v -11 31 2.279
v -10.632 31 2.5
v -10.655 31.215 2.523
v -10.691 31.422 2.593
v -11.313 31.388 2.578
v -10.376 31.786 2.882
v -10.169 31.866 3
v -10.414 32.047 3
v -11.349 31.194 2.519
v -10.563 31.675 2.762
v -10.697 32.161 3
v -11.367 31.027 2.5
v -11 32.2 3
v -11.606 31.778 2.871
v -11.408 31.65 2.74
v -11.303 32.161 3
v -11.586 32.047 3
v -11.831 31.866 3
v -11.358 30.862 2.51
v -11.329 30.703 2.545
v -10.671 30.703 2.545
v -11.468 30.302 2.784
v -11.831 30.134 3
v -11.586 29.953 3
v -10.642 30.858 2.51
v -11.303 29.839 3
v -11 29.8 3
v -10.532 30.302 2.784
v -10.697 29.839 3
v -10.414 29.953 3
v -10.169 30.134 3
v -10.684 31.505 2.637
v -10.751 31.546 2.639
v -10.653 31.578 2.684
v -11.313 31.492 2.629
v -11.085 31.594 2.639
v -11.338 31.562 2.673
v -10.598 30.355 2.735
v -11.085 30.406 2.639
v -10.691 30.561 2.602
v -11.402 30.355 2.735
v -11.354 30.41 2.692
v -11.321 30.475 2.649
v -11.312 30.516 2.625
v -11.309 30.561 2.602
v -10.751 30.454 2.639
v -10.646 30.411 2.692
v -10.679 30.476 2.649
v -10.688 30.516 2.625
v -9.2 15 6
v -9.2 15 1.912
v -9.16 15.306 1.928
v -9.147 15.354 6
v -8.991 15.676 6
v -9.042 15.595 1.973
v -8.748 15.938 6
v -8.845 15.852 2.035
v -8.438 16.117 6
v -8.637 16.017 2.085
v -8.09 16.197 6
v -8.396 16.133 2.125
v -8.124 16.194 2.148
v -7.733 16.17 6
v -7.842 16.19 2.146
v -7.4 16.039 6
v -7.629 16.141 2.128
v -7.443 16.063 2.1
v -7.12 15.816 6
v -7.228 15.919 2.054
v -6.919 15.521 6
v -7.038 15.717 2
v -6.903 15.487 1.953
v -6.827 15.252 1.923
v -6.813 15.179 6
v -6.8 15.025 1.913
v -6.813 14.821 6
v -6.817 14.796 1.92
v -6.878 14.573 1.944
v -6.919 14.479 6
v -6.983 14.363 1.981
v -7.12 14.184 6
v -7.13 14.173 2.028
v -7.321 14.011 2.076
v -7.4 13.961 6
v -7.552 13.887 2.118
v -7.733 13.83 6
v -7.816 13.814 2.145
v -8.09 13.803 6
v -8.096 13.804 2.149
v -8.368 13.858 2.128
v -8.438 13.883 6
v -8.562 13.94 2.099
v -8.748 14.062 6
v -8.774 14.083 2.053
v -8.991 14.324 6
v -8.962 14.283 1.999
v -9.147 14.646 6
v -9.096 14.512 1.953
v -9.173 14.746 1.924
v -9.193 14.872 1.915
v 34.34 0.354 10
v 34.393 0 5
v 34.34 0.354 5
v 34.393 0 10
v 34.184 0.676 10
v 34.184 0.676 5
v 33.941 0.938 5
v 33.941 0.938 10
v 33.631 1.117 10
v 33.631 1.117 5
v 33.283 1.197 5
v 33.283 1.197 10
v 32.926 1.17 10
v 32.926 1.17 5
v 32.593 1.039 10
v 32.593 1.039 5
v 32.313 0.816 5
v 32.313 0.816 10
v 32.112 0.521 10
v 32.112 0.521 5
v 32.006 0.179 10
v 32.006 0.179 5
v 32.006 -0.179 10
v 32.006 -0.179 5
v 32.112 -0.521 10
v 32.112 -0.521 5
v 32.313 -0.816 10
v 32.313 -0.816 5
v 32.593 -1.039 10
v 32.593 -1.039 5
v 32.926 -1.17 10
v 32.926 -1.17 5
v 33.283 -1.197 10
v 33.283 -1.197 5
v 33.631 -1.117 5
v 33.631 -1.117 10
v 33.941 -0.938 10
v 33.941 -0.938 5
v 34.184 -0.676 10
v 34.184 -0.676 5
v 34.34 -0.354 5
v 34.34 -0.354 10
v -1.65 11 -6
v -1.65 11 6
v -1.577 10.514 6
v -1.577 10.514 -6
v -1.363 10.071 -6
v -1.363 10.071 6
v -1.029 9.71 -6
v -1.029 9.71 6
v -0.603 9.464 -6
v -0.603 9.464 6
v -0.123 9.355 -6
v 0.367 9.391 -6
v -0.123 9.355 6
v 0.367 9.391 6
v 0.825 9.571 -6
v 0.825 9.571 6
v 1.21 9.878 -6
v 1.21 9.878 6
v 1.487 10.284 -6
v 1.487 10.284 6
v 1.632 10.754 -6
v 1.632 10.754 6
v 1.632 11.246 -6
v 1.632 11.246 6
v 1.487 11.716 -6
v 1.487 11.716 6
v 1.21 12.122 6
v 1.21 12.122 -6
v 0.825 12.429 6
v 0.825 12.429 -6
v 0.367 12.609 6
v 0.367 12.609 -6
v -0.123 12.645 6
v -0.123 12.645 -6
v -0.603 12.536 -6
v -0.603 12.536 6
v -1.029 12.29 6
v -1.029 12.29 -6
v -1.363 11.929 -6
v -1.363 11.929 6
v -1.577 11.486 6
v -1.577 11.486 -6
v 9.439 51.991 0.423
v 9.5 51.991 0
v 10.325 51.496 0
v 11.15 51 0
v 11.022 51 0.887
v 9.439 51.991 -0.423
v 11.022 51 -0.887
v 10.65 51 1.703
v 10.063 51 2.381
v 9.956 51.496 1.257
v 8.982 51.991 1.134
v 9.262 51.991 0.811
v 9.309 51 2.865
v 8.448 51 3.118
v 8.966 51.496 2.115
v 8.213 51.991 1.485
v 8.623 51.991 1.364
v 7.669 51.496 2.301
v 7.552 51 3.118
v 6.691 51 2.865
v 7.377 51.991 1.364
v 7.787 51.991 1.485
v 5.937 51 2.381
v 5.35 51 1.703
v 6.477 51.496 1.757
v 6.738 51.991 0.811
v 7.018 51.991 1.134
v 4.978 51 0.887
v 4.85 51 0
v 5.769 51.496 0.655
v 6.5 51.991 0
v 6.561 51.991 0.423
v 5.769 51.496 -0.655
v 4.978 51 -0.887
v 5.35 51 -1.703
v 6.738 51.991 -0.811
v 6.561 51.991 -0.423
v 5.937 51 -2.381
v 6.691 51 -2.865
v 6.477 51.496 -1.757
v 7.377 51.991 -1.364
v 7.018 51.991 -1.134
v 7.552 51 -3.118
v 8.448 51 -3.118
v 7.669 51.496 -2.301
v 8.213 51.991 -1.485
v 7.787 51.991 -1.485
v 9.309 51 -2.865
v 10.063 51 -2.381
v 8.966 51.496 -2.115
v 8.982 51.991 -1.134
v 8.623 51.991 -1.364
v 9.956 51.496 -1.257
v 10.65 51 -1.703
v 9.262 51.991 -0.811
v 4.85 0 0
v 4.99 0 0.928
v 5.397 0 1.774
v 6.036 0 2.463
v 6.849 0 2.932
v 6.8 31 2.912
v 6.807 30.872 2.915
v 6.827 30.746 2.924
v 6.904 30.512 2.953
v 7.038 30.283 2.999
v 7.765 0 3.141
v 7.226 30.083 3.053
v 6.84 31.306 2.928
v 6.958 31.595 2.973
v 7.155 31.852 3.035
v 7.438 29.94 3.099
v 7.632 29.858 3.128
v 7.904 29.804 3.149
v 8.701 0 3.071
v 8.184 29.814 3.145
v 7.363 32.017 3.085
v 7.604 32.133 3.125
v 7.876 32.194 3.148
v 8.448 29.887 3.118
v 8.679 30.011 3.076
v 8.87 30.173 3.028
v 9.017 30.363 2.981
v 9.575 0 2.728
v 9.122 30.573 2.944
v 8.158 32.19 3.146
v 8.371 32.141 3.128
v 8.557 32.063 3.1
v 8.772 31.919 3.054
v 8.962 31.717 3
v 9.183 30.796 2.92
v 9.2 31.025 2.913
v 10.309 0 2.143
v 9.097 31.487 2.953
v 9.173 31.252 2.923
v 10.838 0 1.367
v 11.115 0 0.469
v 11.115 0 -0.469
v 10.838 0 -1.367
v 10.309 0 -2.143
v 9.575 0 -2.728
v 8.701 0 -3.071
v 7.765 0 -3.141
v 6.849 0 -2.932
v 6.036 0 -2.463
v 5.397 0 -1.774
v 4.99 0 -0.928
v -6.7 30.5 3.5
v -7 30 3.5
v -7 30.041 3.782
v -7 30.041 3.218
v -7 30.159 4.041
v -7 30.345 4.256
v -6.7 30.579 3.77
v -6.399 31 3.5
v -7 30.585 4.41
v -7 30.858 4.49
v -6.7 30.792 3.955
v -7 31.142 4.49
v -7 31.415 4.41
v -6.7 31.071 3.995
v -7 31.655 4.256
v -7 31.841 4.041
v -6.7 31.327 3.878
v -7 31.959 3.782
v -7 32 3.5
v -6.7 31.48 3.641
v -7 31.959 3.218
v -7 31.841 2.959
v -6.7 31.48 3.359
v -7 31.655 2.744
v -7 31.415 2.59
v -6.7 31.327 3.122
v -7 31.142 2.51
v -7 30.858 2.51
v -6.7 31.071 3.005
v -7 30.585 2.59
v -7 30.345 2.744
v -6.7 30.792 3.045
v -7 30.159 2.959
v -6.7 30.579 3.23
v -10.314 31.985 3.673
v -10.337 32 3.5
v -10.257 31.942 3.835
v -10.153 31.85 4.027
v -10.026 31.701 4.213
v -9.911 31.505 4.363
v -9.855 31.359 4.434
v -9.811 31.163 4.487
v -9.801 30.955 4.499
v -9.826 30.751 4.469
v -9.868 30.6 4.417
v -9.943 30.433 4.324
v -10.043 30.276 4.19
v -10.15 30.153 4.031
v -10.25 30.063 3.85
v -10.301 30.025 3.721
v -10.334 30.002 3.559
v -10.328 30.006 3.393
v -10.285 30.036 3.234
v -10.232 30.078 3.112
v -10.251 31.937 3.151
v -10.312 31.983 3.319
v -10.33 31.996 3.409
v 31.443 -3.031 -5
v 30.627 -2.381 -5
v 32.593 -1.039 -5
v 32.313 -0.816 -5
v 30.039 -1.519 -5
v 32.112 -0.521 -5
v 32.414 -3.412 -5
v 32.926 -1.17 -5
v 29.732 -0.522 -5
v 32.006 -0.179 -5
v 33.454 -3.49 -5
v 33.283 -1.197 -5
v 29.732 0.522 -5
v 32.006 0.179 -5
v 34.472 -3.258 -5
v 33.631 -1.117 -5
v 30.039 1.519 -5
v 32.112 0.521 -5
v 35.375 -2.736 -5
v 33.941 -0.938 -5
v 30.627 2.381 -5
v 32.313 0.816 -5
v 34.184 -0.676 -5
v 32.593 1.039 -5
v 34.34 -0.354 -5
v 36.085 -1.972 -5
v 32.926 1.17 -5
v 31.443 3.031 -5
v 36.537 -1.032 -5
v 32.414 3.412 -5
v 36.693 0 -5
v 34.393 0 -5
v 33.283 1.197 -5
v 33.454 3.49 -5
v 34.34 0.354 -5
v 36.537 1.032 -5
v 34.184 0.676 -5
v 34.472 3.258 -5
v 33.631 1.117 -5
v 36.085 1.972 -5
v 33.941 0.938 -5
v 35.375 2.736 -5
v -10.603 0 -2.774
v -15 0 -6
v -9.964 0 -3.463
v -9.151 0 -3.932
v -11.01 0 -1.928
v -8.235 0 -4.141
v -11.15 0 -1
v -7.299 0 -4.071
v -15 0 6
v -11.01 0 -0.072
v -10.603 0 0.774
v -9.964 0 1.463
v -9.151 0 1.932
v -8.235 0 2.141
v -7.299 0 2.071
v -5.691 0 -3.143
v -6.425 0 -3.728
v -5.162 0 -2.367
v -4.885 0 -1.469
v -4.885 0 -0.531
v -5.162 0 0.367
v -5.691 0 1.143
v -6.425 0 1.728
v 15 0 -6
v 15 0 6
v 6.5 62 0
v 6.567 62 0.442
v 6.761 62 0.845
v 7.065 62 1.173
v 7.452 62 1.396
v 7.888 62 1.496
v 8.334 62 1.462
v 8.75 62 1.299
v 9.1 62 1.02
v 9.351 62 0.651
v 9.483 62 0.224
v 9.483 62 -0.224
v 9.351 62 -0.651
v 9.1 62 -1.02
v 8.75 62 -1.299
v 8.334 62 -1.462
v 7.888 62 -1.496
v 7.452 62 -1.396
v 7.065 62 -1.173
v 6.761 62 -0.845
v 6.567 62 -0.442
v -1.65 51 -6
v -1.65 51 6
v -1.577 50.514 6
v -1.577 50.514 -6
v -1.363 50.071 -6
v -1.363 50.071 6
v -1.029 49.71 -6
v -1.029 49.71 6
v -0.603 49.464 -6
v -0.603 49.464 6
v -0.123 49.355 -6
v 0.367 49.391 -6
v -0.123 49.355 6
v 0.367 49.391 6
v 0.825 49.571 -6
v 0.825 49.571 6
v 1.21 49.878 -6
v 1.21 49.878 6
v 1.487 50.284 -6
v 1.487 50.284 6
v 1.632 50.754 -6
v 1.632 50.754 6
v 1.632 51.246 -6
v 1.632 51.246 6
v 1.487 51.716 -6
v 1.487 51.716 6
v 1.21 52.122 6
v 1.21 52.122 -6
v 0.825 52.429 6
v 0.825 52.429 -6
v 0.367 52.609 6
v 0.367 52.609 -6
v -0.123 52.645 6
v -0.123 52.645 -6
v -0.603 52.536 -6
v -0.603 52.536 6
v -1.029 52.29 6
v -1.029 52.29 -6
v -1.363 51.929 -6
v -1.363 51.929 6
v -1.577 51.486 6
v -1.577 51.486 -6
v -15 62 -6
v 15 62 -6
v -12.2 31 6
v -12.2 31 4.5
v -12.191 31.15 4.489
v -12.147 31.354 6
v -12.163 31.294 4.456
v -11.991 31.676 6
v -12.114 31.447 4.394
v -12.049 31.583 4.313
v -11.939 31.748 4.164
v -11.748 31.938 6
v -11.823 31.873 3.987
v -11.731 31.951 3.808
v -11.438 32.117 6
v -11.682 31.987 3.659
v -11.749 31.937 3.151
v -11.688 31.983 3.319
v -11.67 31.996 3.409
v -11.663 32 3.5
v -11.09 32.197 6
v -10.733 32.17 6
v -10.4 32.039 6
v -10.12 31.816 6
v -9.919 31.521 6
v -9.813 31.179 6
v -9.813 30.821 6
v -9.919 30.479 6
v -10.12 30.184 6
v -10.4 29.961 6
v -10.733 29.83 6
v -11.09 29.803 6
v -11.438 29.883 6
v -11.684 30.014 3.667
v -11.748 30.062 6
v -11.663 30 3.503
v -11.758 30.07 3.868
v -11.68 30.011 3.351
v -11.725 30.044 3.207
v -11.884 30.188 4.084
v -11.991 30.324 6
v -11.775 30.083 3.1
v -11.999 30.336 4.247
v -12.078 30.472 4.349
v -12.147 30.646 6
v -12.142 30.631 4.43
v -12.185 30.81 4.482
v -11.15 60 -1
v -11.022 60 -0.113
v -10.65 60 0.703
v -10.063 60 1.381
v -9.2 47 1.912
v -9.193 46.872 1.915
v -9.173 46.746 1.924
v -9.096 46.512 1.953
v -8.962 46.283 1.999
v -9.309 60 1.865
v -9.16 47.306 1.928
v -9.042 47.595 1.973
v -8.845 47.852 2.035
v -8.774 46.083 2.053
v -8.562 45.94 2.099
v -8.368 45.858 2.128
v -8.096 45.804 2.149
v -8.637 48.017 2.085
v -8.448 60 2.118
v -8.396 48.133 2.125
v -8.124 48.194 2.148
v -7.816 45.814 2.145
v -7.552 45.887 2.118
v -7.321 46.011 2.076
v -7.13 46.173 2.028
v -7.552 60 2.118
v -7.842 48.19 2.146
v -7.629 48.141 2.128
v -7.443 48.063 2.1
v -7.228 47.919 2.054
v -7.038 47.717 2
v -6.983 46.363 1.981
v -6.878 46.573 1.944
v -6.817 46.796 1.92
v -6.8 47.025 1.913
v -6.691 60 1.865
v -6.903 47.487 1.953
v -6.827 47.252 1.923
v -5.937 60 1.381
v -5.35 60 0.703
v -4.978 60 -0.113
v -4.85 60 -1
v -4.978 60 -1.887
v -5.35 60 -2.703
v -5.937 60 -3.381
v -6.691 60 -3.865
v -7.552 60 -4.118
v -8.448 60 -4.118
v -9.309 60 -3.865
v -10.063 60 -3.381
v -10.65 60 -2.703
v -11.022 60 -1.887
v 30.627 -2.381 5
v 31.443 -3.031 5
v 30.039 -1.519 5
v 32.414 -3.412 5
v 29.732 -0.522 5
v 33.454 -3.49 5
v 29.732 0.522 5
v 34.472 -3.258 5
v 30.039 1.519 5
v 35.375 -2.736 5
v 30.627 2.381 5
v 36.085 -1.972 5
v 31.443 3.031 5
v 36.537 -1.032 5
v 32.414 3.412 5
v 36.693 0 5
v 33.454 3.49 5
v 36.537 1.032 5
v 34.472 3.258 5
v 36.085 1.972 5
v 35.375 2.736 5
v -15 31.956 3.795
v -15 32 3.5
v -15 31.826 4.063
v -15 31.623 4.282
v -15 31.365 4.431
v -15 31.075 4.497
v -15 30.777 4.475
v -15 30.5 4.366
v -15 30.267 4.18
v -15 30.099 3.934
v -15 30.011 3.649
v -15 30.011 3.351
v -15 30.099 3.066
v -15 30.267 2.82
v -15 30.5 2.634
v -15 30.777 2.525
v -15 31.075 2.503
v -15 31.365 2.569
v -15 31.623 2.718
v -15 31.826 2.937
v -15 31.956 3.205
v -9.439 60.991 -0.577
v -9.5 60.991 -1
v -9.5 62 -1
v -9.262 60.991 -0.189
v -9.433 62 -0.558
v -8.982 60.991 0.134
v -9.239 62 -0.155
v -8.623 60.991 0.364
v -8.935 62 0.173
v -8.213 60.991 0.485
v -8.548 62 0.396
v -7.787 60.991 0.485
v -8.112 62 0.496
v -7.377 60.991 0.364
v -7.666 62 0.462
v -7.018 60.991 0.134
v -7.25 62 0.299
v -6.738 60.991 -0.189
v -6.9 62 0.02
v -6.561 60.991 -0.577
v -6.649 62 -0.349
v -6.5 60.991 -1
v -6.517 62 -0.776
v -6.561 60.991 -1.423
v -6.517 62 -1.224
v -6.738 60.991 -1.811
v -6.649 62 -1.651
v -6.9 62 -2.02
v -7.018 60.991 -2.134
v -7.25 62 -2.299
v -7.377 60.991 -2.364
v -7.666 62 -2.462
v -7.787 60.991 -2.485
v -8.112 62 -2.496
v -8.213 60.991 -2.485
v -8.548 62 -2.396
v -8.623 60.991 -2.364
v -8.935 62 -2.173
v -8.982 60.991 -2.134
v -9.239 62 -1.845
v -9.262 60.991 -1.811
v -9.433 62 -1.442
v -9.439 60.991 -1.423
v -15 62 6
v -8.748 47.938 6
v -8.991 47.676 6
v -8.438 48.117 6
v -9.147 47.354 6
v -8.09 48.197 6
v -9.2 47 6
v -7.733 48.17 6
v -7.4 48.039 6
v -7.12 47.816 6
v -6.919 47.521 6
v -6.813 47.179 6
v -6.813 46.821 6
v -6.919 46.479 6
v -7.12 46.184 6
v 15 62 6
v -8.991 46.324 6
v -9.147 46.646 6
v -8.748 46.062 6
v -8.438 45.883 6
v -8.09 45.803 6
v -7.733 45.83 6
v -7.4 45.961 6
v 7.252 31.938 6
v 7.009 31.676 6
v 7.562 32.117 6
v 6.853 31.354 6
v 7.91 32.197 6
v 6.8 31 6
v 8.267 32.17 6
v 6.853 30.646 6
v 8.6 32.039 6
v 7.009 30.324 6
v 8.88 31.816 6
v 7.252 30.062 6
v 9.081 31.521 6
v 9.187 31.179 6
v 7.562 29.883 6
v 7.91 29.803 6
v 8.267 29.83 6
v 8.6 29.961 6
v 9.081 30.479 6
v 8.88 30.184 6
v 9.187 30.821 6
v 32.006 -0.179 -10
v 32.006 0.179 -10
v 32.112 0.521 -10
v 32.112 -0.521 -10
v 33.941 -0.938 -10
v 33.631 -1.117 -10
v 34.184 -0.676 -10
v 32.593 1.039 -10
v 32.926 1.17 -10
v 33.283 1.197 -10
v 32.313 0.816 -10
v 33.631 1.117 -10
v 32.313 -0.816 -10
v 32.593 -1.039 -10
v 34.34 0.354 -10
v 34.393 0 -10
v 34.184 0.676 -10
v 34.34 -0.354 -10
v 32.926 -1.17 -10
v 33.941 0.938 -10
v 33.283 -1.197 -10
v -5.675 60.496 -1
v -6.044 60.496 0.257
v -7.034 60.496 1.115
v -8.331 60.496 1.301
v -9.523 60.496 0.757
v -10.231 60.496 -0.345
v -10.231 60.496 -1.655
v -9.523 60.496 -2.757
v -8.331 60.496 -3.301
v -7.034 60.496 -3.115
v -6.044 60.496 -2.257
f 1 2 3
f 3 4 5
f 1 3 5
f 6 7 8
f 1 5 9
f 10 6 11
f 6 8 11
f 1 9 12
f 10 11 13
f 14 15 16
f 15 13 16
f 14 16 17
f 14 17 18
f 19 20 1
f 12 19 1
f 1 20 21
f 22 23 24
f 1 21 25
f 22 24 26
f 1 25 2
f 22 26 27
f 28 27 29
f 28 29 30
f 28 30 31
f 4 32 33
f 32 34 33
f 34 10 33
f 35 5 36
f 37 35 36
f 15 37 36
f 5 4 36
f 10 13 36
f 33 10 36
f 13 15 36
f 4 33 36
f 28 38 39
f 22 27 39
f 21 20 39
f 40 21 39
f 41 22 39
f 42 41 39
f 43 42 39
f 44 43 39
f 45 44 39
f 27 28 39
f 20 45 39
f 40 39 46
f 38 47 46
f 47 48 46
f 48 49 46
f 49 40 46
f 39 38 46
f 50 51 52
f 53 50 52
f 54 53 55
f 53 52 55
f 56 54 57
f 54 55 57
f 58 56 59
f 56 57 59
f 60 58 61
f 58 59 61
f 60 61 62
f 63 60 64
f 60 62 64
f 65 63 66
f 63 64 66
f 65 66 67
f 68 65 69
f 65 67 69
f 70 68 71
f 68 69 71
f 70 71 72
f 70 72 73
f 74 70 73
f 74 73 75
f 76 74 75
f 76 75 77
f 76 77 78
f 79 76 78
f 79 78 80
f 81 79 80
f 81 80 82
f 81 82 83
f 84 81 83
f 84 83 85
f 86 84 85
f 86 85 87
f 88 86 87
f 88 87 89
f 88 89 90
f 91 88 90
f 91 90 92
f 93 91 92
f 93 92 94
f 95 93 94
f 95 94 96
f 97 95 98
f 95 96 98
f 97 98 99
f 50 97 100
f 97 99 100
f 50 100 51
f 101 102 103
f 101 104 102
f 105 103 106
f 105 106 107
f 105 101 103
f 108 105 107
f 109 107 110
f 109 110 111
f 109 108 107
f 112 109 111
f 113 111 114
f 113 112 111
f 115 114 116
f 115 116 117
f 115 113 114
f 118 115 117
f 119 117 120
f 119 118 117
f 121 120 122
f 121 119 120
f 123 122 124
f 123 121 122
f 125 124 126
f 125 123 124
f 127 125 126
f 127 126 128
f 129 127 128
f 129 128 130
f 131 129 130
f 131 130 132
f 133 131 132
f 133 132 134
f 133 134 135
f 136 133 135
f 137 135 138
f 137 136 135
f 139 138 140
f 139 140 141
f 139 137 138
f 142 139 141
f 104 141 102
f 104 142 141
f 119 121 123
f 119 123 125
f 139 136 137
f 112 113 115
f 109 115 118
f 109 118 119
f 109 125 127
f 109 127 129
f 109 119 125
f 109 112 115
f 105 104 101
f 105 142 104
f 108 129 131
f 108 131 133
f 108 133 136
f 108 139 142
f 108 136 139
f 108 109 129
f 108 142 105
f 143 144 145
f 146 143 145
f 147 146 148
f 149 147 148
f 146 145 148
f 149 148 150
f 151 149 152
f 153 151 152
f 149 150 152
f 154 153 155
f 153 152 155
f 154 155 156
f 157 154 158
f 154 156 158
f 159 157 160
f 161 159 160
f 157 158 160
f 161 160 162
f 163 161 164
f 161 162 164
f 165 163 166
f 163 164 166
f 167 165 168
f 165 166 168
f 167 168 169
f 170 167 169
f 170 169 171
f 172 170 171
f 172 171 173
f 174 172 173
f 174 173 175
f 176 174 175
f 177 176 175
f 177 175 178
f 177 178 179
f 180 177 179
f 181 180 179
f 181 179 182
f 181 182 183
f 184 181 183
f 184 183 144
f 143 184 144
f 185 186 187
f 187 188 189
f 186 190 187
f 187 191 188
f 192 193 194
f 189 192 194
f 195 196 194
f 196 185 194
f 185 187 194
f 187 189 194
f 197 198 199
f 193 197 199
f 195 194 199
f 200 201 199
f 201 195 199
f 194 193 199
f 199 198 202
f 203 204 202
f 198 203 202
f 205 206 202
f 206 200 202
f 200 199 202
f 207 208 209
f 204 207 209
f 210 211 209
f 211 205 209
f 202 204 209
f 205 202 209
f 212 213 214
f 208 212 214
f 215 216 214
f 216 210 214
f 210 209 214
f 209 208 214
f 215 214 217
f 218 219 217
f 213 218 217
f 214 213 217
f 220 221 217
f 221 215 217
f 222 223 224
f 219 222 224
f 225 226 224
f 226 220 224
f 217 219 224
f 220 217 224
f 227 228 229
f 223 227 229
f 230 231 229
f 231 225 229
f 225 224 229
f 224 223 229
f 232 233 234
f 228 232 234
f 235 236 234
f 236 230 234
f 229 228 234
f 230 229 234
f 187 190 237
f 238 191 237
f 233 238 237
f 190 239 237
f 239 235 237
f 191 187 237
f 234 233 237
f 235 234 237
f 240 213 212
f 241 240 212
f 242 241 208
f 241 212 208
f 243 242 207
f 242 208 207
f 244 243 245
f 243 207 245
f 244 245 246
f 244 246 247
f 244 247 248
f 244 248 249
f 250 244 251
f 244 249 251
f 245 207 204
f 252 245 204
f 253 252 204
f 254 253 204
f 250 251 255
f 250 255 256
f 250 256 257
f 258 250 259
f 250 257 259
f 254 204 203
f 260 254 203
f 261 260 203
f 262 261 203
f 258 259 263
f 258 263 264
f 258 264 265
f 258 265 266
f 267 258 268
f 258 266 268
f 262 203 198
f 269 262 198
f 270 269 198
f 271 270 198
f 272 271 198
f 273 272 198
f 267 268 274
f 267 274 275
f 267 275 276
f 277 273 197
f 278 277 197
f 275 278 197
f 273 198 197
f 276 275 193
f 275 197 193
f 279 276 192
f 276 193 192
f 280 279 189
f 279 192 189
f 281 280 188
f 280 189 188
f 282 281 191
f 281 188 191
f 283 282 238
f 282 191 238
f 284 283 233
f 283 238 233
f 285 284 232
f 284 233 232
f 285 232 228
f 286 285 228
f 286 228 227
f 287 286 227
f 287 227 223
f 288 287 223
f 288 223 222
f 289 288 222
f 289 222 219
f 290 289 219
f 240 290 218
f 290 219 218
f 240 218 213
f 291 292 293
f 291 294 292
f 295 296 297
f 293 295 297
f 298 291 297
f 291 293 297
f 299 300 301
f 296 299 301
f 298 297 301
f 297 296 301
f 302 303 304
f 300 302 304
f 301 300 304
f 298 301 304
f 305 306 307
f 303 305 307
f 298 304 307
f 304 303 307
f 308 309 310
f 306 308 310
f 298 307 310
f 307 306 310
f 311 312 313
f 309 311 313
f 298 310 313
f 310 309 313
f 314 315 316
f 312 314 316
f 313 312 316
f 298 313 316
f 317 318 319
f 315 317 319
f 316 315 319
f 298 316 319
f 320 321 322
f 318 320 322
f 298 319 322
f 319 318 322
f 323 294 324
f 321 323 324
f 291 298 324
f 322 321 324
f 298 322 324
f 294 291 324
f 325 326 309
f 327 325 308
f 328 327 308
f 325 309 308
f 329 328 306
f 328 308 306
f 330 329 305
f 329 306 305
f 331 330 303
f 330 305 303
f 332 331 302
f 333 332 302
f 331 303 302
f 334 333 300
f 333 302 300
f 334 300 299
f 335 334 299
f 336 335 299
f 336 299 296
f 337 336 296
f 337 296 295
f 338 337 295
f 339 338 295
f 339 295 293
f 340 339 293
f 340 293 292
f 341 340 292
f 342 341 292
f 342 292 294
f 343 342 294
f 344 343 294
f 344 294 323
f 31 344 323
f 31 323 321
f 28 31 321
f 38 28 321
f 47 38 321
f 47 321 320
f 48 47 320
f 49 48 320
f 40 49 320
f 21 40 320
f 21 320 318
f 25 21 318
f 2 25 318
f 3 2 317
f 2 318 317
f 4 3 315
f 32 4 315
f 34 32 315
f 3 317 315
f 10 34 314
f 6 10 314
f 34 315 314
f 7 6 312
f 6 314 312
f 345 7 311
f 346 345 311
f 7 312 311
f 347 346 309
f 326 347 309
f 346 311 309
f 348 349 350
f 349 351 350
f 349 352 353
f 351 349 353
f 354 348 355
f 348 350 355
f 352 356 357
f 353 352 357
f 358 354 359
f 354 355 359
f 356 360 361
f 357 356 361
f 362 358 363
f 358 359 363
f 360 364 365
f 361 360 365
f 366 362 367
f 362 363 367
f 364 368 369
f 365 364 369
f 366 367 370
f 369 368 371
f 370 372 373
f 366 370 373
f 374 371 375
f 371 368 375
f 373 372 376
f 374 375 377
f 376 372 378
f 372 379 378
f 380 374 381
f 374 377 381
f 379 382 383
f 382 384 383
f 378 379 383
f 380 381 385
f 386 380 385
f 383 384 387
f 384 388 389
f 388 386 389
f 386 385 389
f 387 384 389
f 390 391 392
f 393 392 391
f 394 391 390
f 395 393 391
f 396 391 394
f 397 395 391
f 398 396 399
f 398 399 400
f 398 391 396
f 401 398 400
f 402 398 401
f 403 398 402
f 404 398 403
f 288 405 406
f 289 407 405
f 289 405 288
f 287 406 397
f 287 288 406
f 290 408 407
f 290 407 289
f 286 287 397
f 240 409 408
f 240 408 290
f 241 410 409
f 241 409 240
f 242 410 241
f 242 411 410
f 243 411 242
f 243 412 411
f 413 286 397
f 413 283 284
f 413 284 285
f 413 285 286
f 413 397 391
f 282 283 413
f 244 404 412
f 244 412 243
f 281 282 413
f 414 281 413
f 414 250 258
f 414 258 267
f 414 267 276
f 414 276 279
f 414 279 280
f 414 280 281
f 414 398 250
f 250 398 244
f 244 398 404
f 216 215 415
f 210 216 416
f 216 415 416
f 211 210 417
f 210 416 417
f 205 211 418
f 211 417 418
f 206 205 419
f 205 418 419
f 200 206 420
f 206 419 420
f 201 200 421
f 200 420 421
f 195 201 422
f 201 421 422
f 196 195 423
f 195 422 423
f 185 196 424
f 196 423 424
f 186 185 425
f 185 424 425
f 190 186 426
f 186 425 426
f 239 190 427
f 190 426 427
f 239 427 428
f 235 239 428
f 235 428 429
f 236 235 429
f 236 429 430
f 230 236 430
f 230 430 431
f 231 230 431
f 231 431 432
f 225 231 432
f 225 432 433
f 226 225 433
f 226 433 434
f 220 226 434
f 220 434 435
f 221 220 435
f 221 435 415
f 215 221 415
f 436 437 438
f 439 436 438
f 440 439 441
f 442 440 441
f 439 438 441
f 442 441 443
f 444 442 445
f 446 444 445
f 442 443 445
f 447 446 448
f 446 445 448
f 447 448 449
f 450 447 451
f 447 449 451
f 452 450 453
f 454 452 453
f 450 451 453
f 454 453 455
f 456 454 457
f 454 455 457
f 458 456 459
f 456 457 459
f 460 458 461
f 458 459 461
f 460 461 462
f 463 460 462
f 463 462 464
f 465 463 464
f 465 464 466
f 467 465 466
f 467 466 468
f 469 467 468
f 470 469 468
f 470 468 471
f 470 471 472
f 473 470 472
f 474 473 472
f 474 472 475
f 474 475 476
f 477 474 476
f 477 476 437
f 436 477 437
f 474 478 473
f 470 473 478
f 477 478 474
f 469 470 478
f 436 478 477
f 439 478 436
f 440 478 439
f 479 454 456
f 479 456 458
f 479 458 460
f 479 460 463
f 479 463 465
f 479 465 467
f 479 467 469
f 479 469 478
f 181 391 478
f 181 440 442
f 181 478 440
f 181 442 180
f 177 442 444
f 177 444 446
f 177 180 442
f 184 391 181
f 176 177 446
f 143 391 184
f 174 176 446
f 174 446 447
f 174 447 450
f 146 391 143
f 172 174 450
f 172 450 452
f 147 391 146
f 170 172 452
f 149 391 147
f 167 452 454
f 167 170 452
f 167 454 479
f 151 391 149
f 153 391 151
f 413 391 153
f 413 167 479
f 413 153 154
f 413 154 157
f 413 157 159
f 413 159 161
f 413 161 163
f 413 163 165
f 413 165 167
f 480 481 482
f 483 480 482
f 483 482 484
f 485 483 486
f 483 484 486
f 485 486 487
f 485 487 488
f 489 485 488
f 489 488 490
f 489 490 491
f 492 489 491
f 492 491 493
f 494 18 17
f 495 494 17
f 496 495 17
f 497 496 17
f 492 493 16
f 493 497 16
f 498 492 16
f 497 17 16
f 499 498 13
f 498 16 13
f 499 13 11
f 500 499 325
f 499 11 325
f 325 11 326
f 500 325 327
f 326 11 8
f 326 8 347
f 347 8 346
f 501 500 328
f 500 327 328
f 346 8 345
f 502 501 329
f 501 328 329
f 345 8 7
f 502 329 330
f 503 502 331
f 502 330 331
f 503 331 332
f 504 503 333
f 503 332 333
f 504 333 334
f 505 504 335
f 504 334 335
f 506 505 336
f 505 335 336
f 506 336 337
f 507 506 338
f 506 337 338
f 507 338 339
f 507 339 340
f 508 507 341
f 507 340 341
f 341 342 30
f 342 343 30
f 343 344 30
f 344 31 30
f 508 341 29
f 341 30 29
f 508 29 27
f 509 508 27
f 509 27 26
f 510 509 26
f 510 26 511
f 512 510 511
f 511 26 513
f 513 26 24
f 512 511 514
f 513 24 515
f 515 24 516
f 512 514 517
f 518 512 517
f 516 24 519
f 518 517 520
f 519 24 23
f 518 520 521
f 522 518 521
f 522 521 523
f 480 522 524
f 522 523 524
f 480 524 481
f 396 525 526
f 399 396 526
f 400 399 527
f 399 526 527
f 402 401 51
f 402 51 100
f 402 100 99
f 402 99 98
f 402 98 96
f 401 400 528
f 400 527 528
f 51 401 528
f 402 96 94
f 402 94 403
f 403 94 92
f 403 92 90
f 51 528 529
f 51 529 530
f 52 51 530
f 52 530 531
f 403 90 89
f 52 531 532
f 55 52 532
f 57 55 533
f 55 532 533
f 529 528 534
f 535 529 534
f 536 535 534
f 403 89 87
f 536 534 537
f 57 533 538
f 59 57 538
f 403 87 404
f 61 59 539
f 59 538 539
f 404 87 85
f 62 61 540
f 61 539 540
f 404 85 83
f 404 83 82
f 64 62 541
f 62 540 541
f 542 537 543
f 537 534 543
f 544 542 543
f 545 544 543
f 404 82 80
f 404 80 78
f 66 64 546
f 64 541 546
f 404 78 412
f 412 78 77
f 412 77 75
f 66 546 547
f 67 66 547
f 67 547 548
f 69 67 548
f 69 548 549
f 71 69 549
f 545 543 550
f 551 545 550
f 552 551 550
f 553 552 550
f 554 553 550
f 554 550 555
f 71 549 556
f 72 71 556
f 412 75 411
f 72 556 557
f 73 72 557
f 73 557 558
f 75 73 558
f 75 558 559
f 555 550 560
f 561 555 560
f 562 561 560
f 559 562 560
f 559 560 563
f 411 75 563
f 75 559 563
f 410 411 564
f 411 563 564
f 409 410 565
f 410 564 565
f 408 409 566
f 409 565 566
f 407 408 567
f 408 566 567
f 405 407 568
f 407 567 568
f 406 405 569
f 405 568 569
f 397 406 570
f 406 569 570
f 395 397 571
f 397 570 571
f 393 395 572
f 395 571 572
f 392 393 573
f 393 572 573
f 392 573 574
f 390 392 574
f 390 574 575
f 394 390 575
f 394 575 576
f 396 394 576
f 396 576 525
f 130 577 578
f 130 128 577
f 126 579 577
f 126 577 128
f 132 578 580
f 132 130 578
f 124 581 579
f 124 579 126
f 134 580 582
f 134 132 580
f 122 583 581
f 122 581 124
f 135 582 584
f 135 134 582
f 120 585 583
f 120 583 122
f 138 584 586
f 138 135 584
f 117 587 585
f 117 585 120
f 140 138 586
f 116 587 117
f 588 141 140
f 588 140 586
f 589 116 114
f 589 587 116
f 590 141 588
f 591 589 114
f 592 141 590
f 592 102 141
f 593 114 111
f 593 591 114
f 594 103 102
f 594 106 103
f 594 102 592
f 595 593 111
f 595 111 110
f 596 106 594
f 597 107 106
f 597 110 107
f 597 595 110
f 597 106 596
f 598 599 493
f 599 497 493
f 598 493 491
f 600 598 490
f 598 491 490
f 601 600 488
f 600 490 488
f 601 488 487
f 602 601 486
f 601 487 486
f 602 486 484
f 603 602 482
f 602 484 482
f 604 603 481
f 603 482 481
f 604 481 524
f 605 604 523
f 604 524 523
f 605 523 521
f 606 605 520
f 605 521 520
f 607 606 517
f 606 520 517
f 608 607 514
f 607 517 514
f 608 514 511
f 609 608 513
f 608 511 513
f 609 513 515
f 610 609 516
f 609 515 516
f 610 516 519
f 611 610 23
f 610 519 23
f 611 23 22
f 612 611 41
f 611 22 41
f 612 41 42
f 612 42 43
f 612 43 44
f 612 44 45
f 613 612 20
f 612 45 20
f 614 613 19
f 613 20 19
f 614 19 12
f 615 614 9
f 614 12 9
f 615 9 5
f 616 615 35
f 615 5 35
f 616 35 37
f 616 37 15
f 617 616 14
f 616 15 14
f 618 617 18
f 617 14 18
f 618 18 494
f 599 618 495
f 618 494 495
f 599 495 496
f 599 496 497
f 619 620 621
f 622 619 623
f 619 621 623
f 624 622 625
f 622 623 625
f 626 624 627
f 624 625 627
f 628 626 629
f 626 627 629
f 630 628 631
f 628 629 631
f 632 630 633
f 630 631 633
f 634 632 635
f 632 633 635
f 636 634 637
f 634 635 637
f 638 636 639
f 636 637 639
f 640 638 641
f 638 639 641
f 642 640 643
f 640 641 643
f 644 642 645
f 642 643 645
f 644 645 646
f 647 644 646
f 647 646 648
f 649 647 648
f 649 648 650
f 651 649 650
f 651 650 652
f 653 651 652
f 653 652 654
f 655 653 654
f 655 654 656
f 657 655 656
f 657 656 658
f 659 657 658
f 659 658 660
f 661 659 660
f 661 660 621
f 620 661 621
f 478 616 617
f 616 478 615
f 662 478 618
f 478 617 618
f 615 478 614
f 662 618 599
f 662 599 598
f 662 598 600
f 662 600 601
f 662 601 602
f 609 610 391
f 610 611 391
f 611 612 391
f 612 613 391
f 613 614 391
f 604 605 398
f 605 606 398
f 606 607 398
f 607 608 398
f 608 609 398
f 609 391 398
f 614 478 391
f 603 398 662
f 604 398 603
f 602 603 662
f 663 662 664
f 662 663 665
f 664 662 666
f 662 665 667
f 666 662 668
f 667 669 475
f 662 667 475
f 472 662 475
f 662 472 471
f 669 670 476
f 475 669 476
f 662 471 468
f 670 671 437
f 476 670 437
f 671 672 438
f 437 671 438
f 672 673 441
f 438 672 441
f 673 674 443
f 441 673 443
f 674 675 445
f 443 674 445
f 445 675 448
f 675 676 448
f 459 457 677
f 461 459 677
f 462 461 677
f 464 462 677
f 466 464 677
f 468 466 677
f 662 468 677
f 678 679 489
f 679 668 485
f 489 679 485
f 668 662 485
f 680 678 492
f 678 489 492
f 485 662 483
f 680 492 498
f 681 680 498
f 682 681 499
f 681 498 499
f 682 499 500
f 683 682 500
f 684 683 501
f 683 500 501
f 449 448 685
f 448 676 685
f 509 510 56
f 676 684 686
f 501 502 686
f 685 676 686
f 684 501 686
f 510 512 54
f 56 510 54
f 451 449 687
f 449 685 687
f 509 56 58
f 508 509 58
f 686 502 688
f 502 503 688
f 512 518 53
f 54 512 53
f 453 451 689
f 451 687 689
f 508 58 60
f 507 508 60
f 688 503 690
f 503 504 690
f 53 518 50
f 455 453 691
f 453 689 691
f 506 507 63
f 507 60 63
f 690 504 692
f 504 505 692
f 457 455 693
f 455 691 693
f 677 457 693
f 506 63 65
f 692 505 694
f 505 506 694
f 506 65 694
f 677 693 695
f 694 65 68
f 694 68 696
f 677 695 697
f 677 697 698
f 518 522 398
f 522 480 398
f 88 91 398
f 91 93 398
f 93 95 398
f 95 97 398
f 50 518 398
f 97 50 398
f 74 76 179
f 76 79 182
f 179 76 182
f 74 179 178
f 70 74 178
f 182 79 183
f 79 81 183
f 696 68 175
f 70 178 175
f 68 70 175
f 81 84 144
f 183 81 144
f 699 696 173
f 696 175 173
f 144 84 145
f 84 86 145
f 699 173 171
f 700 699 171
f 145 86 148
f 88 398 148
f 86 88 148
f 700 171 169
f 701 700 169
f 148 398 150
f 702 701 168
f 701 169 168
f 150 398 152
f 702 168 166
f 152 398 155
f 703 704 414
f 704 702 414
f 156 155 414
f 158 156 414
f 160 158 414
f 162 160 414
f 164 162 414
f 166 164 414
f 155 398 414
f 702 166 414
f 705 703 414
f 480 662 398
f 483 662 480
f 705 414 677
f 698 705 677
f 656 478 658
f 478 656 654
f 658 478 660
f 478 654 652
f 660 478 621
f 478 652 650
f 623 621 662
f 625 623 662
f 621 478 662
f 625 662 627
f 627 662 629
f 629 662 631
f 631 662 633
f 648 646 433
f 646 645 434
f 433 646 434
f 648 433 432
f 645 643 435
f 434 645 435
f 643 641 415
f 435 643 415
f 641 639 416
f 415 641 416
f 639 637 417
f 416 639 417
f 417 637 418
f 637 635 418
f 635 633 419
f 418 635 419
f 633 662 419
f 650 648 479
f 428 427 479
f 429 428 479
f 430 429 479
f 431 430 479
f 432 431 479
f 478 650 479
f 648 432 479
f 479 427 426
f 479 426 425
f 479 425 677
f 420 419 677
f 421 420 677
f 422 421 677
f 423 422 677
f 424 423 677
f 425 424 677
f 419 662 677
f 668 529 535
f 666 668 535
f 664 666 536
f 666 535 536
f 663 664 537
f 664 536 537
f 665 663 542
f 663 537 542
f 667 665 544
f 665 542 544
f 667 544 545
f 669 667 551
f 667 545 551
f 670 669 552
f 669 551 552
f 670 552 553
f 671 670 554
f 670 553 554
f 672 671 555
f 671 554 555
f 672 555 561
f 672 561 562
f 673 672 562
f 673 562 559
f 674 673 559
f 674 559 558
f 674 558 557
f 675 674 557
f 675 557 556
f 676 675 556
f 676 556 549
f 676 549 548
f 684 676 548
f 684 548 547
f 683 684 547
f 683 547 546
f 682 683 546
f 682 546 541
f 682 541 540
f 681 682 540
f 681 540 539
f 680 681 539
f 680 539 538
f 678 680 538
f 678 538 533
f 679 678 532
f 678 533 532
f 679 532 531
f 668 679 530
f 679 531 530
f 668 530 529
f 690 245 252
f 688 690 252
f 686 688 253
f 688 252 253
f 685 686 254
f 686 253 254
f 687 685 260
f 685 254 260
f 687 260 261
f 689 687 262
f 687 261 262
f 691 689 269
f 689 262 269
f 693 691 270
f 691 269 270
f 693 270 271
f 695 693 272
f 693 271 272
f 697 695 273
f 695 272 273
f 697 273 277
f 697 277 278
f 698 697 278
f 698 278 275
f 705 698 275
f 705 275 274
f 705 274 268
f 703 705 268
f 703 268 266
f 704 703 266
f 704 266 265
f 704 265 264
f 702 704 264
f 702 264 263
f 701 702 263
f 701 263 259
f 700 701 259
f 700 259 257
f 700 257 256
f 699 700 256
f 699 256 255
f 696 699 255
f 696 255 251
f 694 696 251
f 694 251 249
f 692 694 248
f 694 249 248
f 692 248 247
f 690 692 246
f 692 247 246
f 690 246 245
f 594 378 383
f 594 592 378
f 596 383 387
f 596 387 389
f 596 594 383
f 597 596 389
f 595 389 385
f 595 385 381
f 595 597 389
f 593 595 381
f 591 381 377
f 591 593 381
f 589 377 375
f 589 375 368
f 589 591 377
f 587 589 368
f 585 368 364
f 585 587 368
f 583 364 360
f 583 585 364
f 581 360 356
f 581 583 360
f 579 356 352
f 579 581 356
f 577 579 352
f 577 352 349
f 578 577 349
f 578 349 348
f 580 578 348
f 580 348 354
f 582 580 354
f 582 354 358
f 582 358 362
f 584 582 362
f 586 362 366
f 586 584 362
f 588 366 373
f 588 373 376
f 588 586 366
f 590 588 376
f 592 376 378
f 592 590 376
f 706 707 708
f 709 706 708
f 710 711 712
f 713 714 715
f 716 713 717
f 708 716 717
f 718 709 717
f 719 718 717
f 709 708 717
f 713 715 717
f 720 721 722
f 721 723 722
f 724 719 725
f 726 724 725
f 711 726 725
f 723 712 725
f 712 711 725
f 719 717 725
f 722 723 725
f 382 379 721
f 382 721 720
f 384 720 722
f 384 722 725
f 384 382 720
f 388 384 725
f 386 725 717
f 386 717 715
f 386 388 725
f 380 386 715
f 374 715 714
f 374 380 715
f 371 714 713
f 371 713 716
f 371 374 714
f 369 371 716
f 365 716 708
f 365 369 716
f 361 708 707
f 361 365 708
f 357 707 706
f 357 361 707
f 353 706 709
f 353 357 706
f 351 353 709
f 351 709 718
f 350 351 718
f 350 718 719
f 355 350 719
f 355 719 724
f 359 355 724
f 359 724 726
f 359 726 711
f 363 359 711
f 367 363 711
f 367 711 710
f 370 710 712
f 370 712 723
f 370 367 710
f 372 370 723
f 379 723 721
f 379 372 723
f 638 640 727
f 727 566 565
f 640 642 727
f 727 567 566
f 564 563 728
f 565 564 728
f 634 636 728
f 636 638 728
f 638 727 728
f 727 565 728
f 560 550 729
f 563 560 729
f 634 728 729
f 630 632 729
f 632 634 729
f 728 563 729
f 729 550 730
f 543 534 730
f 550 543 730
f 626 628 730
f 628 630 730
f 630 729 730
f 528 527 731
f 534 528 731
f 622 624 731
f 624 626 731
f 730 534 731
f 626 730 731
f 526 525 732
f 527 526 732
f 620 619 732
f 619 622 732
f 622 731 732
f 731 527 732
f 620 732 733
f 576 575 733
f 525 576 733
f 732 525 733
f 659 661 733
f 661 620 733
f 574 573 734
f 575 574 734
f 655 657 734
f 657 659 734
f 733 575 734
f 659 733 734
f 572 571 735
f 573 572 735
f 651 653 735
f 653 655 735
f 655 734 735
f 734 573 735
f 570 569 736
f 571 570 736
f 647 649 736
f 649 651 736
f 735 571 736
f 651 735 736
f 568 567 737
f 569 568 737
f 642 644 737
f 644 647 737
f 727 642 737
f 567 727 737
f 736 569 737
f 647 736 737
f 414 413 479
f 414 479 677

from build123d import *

# Parameters (mm, degrees)
F0_W      = 30
F0_H      = 12
F1_DEPTH  = 62
F2_D      = 6.3
F2_DEPTH  = 60
F2_TIP    = 1.8927109499
F3_D      = 6.3
F3_DEPTH  = 51
F3_TIP    = 1.8927109499
F5_D      = 3.3
F6_R      = 1.2
F7_DEPTH  = 10
F6_R_2    = 3.5
F8_DEPTH  = 5
F10_D     = 2
F10_DEPTH = 8
F10_TIP   = 0.600860619
F12_D     = 2.4
F12_DEPTH = 8
F12_TIP   = 0.7210327428
F13_D     = 2.4
F13_DEPTH = 3
F13_TIP   = 0.7210327428
F14_D     = 3


# Not quite as in the source:
# - a feature names something its author has since deleted; it is built from what else it names


with BuildPart() as f1:
    # F0 (on Front) → F1 (new body)
    with BuildSketch(Plane.XZ):
        Rectangle(F0_W, F0_H)
    extrude(amount=-F1_DEPTH)

    # F2
    with Locations(Plane.XZ):
        with Locations((-8, -1)):
            Hole(F2_D / 2, depth=F2_DEPTH)
            with Locations((0, 0, -(F2_DEPTH + F2_TIP / 2))):  # 118° drill point
                Cone(0, F2_D / 2, F2_TIP, mode=Mode.SUBTRACT)

    # F3
    with Locations(Plane.XZ):
        with Locations((8, 0)):
            Hole(F3_D / 2, depth=F3_DEPTH)
            with Locations((0, 0, -(F3_DEPTH + F3_TIP / 2))):  # 118° drill point
                Cone(0, F3_D / 2, F3_TIP, mode=Mode.SUBTRACT)

    # F5 (through all)
    with Locations(Plane(origin=(0, 0, -6), x_dir=(1, 0, 0), z_dir=(0, 0, -1))):
        with Locations((0, -11), (0, -51)):
            Hole(F5_D / 2)

    # F10
    with Locations(Plane(origin=(-15, 0, 0), x_dir=(0, -1, 0), z_dir=(-1, 0, 0))):
        with Locations((-31, 3.5)):
            Hole(F10_D / 2, depth=F10_DEPTH)
            with Locations((0, 0, -(F10_DEPTH + F10_TIP / 2))):  # 118° drill point
                Cone(0, F10_D / 2, F10_TIP, mode=Mode.SUBTRACT)

    # F12
    with Locations(Plane.XY.offset(6)):
        with Locations((-8, 15), (-8, 47), (8, 31)):
            Hole(F12_D / 2, depth=F12_DEPTH)
            with Locations((0, 0, -(F12_DEPTH + F12_TIP / 2))):  # 118° drill point
                Cone(0, F12_D / 2, F12_TIP, mode=Mode.SUBTRACT)

    # F13
    with Locations(Plane.XY.offset(6)):
        with Locations((-11, 31)):
            Hole(F13_D / 2, depth=F13_DEPTH)
            with Locations((0, 0, -(F13_DEPTH + F13_TIP / 2))):  # 118° drill point
                Cone(0, F13_D / 2, F13_TIP, mode=Mode.SUBTRACT)

    # F14 (through all)
    with Locations(Plane.XZ):
        with Locations((-8, -1), (8, 0)):
            Hole(F14_D / 2)


with BuildPart() as f7:
    # F6 (on Top) → F7 (new body, symmetric)
    with BuildSketch(Plane.XY):
        with Locations((33.1928394735, 0)):
            Circle(F6_R)
    extrude(amount=F7_DEPTH, both=True)

    # F6 (on Top) → F8 (join, symmetric)
    with BuildSketch(Plane.XY):
        with Locations((33.1928394735, 0)):
            Circle(F6_R_2)
        with Locations((33.1928394735, 0)):
            Circle(F6_R, mode=Mode.SUBTRACT)
    extrude(amount=F8_DEPTH, both=True)


solid = Compound([f1.part, f7.part])
